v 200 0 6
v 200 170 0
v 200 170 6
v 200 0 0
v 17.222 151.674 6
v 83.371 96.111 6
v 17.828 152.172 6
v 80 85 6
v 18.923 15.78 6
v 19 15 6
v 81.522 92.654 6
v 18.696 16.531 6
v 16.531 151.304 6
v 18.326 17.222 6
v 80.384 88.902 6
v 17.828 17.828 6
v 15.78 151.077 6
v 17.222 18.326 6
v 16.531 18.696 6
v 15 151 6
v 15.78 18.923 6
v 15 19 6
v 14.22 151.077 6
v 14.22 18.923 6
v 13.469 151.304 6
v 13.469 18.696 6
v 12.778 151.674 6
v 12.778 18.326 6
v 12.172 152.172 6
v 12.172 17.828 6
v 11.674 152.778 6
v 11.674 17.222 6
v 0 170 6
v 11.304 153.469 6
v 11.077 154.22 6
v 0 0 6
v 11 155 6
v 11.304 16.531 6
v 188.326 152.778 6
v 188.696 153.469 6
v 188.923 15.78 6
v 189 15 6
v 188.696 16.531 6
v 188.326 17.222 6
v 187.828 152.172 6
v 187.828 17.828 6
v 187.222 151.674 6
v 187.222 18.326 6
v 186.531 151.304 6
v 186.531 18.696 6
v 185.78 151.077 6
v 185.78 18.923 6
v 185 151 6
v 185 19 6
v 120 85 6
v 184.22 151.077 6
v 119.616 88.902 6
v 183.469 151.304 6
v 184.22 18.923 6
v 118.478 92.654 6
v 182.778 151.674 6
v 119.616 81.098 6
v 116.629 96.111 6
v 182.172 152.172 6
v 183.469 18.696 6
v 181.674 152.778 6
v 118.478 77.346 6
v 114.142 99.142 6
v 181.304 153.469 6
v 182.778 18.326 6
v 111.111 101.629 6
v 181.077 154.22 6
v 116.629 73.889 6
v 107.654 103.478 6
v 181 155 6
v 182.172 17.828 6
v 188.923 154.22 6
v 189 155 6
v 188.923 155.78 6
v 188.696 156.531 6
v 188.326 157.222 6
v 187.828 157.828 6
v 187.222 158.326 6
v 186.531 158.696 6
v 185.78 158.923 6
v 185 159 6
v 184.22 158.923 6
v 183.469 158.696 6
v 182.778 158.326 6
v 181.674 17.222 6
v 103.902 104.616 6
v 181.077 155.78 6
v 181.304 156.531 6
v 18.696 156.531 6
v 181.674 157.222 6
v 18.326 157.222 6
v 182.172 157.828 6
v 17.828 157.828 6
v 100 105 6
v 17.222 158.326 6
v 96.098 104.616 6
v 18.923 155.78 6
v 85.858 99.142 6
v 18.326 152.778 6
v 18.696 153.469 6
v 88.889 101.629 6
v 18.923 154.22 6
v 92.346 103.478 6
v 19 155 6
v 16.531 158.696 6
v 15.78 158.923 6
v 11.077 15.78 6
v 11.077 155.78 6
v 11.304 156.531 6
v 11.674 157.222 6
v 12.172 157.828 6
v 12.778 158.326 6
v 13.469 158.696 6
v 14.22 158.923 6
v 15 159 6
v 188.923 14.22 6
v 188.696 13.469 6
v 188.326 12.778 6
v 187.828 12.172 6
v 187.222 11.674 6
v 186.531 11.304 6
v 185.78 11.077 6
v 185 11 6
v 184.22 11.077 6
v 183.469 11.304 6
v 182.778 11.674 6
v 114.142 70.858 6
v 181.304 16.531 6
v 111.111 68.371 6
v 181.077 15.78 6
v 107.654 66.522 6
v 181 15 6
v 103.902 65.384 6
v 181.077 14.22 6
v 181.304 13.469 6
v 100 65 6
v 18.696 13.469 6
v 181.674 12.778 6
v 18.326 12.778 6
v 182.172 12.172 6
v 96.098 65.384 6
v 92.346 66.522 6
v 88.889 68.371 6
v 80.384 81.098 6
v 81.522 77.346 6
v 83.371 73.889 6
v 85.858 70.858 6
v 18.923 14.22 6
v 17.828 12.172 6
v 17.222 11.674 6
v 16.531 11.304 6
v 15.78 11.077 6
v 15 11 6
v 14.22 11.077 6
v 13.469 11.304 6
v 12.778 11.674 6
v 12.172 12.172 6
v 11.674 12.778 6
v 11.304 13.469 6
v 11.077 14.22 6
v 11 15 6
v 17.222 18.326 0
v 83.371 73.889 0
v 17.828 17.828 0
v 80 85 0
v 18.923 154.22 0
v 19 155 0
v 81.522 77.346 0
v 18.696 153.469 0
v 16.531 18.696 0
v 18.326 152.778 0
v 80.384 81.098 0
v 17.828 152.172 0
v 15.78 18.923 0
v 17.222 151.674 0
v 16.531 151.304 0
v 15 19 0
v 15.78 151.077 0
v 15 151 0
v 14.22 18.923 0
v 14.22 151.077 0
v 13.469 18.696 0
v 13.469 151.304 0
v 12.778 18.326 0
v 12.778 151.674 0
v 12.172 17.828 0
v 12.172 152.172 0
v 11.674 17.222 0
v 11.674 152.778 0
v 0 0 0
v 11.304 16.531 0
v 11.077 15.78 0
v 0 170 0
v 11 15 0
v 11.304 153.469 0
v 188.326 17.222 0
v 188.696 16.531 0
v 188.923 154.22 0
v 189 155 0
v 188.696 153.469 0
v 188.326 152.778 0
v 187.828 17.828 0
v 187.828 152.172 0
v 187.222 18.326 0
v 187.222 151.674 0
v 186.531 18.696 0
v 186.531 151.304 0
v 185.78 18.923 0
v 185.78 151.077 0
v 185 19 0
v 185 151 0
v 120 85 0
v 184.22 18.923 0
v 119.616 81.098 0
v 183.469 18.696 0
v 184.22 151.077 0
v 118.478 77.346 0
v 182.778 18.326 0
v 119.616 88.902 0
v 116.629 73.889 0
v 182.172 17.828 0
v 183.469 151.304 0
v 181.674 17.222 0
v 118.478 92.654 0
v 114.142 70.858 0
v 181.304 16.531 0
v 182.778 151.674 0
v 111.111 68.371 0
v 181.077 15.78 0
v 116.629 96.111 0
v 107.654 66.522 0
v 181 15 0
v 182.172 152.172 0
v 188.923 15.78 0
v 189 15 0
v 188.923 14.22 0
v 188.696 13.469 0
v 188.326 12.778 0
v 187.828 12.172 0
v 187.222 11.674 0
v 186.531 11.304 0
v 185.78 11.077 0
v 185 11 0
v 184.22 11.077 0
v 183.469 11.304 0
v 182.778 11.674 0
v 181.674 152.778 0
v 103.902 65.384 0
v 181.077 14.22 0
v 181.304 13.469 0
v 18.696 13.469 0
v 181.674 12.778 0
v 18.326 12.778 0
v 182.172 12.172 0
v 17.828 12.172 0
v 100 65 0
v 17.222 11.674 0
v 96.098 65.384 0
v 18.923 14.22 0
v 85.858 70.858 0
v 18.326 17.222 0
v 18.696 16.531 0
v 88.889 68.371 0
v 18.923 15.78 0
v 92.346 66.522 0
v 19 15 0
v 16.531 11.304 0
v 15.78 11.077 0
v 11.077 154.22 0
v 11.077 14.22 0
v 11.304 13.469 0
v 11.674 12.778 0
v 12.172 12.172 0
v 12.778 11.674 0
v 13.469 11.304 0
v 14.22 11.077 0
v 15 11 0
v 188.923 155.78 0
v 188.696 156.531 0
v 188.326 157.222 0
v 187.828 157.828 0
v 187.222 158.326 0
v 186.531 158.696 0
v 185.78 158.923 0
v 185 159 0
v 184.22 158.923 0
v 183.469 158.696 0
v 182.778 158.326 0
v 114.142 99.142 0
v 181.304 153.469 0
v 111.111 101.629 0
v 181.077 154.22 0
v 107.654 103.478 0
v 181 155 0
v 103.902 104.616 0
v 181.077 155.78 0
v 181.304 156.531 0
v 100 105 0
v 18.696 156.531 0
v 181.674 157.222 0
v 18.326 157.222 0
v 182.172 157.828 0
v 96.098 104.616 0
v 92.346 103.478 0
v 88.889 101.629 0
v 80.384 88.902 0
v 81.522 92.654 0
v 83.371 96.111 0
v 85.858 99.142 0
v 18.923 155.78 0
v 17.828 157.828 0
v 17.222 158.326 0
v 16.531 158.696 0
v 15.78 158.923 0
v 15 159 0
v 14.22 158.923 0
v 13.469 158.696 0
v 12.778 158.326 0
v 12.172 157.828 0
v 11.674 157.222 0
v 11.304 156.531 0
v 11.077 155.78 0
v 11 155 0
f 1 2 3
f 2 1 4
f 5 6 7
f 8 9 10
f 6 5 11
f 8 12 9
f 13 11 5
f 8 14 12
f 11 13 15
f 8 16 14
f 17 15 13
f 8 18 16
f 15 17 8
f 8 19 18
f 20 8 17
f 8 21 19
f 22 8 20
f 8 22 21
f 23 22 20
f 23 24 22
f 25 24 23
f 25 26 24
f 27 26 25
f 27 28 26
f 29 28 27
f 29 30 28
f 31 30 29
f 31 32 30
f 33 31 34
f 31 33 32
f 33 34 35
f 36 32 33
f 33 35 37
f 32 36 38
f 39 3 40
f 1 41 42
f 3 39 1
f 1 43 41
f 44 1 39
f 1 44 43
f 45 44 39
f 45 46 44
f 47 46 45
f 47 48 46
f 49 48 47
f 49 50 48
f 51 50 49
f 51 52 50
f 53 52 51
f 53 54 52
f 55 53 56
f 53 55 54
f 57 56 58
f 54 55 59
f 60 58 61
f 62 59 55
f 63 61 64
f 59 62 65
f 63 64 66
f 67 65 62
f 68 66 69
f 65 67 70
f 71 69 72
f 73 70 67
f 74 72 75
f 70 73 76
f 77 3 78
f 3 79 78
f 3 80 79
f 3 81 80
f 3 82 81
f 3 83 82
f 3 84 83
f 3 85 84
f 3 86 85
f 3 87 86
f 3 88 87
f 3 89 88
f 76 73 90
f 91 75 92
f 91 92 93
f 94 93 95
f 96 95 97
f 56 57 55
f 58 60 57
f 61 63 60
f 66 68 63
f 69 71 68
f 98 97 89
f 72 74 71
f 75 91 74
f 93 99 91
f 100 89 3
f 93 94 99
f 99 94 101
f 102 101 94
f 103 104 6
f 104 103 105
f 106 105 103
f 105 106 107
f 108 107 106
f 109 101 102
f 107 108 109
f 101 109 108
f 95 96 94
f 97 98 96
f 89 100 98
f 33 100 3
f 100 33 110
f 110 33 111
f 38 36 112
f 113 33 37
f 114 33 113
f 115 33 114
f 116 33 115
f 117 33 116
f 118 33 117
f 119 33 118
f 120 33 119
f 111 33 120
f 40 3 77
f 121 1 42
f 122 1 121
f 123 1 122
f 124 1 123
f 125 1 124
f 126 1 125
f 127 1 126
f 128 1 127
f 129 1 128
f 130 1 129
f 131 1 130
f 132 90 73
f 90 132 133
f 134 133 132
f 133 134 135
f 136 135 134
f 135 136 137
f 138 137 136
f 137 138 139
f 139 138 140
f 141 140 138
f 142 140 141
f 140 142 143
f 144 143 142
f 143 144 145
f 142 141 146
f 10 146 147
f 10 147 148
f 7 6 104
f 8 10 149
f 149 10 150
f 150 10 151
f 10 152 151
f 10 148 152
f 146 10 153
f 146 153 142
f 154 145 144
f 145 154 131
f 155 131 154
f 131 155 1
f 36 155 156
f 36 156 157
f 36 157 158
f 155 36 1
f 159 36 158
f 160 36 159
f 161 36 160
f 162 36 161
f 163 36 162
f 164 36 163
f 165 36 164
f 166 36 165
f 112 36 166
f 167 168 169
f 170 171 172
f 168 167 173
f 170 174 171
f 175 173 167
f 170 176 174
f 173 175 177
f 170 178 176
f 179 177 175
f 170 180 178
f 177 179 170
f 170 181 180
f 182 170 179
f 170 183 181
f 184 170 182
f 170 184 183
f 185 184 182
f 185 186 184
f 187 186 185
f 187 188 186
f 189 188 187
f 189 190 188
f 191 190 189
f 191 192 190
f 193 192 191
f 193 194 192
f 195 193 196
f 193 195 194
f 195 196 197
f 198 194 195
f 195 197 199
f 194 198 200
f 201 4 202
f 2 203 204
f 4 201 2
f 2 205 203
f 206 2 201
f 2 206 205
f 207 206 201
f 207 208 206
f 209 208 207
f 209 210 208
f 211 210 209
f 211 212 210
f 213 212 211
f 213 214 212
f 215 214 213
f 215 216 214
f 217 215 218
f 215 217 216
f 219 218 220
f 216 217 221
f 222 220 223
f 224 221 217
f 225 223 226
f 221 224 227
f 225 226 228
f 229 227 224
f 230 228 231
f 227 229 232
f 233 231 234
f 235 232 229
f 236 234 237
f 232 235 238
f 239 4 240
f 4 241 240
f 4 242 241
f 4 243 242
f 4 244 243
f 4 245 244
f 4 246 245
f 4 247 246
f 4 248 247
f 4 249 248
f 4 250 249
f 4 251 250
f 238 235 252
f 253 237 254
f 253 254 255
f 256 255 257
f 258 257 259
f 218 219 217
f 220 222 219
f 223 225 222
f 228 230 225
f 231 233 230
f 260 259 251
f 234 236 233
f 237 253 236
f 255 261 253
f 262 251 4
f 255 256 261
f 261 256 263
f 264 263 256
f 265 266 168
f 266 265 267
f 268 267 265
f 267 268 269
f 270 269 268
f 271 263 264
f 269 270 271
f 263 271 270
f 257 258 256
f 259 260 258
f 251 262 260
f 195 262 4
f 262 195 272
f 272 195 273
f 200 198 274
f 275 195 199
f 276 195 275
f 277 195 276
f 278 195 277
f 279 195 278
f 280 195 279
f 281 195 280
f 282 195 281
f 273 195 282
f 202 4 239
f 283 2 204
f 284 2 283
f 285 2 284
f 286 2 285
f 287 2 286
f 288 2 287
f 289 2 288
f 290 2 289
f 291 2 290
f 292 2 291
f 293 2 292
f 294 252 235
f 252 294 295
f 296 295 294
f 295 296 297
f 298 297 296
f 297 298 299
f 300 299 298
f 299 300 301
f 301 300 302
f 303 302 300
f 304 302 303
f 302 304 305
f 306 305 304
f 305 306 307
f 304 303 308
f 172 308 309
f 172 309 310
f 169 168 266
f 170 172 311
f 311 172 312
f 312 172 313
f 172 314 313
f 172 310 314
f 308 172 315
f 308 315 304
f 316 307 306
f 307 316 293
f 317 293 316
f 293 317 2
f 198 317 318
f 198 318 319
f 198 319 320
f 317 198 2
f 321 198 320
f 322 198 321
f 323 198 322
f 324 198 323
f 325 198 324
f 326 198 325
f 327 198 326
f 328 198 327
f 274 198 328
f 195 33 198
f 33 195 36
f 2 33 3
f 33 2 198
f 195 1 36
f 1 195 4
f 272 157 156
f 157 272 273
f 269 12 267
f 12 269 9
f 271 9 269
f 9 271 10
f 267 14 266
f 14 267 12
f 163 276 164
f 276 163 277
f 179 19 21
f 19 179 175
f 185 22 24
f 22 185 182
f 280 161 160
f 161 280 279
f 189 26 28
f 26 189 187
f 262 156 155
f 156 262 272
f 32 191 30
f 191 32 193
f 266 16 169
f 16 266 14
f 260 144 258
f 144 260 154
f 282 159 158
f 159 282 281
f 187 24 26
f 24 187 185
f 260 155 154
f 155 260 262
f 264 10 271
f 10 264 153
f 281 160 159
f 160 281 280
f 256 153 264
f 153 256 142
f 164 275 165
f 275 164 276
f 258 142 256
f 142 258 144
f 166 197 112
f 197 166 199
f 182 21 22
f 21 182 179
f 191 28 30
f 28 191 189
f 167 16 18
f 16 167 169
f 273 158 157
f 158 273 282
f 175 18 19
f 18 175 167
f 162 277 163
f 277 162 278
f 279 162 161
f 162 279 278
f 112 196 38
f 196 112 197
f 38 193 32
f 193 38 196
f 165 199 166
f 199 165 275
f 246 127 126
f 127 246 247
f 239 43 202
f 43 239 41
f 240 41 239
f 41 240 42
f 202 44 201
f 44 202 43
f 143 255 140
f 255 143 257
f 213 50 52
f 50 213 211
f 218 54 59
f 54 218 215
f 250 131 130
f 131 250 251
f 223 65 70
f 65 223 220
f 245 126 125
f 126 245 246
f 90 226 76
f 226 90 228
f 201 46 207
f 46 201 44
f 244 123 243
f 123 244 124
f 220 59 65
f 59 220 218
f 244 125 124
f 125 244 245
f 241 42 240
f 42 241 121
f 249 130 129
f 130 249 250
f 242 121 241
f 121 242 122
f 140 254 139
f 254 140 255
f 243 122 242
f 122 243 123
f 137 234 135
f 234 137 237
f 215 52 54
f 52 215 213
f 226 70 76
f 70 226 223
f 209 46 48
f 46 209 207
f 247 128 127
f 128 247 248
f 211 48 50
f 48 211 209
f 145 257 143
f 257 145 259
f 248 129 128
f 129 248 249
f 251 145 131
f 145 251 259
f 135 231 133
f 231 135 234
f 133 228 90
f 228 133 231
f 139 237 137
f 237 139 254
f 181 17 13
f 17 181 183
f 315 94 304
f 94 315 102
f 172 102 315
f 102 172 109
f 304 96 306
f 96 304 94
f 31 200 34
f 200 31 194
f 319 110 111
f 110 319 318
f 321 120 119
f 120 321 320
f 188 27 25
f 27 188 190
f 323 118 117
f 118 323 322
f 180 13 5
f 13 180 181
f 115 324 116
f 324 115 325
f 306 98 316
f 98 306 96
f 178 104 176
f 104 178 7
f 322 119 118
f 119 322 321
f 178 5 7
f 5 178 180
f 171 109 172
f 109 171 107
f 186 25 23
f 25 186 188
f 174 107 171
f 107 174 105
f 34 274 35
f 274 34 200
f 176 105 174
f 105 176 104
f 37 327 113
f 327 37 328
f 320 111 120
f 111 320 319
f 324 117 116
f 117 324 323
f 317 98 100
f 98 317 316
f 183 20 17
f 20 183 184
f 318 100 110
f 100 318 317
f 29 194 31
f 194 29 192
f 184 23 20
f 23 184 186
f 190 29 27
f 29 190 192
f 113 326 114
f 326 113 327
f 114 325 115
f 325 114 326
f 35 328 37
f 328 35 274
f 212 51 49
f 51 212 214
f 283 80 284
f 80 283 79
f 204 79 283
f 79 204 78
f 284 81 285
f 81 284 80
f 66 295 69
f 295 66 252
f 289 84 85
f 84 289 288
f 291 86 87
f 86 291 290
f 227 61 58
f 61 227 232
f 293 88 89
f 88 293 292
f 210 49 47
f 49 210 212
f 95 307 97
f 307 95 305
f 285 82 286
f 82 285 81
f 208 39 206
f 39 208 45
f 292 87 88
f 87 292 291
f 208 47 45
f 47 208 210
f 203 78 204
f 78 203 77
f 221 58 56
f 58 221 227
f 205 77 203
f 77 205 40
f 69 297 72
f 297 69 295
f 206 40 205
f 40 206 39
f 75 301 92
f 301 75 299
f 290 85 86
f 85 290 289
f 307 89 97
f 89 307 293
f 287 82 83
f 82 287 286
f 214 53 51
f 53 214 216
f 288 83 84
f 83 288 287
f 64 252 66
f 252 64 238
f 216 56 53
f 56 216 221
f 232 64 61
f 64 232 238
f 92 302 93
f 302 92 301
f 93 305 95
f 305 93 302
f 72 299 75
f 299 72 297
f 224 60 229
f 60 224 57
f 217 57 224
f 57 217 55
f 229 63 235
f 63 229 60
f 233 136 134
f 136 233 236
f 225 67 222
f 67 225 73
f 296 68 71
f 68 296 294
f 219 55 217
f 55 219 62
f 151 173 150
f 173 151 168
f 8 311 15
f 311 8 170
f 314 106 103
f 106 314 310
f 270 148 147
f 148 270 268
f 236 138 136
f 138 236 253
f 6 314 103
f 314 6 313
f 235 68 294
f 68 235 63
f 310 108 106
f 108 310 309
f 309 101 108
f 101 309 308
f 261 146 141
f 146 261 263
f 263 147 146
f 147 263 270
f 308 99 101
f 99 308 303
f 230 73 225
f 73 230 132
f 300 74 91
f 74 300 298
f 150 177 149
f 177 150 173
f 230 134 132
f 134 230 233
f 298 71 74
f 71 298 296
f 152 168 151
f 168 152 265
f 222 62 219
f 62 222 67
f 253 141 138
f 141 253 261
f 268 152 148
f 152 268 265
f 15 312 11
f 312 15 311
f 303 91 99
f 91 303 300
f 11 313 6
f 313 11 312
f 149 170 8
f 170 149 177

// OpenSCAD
$fn = 32;

// ----------------------------------------------------------------------
// Big plate: 200-250 mm adapter plate
// ----------------------------------------------------------------------

// --- parameters (mm) ---
plate_l = 200;            // plate length, X
plate_w = 170;            // plate width, Y
plate_t = 6;              // plate thickness, Z
corner_d = 8;             // corner hole diameter
corner_in = 15;           // corner hole inset from the edges
bore_d = 40;              // central bore
fit_tol = 0.1;            // tolerance for press fits, mm
free_tol = 0.5;           // tolerance for clearance fits, mm

difference() {
  cube([plate_l, plate_w, plate_t]);
  translate([corner_in, corner_in, -1]) cylinder(h = plate_t + 2, d = corner_d);
  translate([plate_l - corner_in, corner_in, -1]) cylinder(h = plate_t + 2, d = corner_d);
  translate([corner_in, plate_w - corner_in, -1]) cylinder(h = plate_t + 2, d = corner_d);
  translate([plate_l - corner_in, plate_w - corner_in, -1]) cylinder(h = plate_t + 2, d = corner_d);
  translate([plate_l / 2, plate_w / 2, -1]) cylinder(h = plate_t + 2, d = bore_d);
}
